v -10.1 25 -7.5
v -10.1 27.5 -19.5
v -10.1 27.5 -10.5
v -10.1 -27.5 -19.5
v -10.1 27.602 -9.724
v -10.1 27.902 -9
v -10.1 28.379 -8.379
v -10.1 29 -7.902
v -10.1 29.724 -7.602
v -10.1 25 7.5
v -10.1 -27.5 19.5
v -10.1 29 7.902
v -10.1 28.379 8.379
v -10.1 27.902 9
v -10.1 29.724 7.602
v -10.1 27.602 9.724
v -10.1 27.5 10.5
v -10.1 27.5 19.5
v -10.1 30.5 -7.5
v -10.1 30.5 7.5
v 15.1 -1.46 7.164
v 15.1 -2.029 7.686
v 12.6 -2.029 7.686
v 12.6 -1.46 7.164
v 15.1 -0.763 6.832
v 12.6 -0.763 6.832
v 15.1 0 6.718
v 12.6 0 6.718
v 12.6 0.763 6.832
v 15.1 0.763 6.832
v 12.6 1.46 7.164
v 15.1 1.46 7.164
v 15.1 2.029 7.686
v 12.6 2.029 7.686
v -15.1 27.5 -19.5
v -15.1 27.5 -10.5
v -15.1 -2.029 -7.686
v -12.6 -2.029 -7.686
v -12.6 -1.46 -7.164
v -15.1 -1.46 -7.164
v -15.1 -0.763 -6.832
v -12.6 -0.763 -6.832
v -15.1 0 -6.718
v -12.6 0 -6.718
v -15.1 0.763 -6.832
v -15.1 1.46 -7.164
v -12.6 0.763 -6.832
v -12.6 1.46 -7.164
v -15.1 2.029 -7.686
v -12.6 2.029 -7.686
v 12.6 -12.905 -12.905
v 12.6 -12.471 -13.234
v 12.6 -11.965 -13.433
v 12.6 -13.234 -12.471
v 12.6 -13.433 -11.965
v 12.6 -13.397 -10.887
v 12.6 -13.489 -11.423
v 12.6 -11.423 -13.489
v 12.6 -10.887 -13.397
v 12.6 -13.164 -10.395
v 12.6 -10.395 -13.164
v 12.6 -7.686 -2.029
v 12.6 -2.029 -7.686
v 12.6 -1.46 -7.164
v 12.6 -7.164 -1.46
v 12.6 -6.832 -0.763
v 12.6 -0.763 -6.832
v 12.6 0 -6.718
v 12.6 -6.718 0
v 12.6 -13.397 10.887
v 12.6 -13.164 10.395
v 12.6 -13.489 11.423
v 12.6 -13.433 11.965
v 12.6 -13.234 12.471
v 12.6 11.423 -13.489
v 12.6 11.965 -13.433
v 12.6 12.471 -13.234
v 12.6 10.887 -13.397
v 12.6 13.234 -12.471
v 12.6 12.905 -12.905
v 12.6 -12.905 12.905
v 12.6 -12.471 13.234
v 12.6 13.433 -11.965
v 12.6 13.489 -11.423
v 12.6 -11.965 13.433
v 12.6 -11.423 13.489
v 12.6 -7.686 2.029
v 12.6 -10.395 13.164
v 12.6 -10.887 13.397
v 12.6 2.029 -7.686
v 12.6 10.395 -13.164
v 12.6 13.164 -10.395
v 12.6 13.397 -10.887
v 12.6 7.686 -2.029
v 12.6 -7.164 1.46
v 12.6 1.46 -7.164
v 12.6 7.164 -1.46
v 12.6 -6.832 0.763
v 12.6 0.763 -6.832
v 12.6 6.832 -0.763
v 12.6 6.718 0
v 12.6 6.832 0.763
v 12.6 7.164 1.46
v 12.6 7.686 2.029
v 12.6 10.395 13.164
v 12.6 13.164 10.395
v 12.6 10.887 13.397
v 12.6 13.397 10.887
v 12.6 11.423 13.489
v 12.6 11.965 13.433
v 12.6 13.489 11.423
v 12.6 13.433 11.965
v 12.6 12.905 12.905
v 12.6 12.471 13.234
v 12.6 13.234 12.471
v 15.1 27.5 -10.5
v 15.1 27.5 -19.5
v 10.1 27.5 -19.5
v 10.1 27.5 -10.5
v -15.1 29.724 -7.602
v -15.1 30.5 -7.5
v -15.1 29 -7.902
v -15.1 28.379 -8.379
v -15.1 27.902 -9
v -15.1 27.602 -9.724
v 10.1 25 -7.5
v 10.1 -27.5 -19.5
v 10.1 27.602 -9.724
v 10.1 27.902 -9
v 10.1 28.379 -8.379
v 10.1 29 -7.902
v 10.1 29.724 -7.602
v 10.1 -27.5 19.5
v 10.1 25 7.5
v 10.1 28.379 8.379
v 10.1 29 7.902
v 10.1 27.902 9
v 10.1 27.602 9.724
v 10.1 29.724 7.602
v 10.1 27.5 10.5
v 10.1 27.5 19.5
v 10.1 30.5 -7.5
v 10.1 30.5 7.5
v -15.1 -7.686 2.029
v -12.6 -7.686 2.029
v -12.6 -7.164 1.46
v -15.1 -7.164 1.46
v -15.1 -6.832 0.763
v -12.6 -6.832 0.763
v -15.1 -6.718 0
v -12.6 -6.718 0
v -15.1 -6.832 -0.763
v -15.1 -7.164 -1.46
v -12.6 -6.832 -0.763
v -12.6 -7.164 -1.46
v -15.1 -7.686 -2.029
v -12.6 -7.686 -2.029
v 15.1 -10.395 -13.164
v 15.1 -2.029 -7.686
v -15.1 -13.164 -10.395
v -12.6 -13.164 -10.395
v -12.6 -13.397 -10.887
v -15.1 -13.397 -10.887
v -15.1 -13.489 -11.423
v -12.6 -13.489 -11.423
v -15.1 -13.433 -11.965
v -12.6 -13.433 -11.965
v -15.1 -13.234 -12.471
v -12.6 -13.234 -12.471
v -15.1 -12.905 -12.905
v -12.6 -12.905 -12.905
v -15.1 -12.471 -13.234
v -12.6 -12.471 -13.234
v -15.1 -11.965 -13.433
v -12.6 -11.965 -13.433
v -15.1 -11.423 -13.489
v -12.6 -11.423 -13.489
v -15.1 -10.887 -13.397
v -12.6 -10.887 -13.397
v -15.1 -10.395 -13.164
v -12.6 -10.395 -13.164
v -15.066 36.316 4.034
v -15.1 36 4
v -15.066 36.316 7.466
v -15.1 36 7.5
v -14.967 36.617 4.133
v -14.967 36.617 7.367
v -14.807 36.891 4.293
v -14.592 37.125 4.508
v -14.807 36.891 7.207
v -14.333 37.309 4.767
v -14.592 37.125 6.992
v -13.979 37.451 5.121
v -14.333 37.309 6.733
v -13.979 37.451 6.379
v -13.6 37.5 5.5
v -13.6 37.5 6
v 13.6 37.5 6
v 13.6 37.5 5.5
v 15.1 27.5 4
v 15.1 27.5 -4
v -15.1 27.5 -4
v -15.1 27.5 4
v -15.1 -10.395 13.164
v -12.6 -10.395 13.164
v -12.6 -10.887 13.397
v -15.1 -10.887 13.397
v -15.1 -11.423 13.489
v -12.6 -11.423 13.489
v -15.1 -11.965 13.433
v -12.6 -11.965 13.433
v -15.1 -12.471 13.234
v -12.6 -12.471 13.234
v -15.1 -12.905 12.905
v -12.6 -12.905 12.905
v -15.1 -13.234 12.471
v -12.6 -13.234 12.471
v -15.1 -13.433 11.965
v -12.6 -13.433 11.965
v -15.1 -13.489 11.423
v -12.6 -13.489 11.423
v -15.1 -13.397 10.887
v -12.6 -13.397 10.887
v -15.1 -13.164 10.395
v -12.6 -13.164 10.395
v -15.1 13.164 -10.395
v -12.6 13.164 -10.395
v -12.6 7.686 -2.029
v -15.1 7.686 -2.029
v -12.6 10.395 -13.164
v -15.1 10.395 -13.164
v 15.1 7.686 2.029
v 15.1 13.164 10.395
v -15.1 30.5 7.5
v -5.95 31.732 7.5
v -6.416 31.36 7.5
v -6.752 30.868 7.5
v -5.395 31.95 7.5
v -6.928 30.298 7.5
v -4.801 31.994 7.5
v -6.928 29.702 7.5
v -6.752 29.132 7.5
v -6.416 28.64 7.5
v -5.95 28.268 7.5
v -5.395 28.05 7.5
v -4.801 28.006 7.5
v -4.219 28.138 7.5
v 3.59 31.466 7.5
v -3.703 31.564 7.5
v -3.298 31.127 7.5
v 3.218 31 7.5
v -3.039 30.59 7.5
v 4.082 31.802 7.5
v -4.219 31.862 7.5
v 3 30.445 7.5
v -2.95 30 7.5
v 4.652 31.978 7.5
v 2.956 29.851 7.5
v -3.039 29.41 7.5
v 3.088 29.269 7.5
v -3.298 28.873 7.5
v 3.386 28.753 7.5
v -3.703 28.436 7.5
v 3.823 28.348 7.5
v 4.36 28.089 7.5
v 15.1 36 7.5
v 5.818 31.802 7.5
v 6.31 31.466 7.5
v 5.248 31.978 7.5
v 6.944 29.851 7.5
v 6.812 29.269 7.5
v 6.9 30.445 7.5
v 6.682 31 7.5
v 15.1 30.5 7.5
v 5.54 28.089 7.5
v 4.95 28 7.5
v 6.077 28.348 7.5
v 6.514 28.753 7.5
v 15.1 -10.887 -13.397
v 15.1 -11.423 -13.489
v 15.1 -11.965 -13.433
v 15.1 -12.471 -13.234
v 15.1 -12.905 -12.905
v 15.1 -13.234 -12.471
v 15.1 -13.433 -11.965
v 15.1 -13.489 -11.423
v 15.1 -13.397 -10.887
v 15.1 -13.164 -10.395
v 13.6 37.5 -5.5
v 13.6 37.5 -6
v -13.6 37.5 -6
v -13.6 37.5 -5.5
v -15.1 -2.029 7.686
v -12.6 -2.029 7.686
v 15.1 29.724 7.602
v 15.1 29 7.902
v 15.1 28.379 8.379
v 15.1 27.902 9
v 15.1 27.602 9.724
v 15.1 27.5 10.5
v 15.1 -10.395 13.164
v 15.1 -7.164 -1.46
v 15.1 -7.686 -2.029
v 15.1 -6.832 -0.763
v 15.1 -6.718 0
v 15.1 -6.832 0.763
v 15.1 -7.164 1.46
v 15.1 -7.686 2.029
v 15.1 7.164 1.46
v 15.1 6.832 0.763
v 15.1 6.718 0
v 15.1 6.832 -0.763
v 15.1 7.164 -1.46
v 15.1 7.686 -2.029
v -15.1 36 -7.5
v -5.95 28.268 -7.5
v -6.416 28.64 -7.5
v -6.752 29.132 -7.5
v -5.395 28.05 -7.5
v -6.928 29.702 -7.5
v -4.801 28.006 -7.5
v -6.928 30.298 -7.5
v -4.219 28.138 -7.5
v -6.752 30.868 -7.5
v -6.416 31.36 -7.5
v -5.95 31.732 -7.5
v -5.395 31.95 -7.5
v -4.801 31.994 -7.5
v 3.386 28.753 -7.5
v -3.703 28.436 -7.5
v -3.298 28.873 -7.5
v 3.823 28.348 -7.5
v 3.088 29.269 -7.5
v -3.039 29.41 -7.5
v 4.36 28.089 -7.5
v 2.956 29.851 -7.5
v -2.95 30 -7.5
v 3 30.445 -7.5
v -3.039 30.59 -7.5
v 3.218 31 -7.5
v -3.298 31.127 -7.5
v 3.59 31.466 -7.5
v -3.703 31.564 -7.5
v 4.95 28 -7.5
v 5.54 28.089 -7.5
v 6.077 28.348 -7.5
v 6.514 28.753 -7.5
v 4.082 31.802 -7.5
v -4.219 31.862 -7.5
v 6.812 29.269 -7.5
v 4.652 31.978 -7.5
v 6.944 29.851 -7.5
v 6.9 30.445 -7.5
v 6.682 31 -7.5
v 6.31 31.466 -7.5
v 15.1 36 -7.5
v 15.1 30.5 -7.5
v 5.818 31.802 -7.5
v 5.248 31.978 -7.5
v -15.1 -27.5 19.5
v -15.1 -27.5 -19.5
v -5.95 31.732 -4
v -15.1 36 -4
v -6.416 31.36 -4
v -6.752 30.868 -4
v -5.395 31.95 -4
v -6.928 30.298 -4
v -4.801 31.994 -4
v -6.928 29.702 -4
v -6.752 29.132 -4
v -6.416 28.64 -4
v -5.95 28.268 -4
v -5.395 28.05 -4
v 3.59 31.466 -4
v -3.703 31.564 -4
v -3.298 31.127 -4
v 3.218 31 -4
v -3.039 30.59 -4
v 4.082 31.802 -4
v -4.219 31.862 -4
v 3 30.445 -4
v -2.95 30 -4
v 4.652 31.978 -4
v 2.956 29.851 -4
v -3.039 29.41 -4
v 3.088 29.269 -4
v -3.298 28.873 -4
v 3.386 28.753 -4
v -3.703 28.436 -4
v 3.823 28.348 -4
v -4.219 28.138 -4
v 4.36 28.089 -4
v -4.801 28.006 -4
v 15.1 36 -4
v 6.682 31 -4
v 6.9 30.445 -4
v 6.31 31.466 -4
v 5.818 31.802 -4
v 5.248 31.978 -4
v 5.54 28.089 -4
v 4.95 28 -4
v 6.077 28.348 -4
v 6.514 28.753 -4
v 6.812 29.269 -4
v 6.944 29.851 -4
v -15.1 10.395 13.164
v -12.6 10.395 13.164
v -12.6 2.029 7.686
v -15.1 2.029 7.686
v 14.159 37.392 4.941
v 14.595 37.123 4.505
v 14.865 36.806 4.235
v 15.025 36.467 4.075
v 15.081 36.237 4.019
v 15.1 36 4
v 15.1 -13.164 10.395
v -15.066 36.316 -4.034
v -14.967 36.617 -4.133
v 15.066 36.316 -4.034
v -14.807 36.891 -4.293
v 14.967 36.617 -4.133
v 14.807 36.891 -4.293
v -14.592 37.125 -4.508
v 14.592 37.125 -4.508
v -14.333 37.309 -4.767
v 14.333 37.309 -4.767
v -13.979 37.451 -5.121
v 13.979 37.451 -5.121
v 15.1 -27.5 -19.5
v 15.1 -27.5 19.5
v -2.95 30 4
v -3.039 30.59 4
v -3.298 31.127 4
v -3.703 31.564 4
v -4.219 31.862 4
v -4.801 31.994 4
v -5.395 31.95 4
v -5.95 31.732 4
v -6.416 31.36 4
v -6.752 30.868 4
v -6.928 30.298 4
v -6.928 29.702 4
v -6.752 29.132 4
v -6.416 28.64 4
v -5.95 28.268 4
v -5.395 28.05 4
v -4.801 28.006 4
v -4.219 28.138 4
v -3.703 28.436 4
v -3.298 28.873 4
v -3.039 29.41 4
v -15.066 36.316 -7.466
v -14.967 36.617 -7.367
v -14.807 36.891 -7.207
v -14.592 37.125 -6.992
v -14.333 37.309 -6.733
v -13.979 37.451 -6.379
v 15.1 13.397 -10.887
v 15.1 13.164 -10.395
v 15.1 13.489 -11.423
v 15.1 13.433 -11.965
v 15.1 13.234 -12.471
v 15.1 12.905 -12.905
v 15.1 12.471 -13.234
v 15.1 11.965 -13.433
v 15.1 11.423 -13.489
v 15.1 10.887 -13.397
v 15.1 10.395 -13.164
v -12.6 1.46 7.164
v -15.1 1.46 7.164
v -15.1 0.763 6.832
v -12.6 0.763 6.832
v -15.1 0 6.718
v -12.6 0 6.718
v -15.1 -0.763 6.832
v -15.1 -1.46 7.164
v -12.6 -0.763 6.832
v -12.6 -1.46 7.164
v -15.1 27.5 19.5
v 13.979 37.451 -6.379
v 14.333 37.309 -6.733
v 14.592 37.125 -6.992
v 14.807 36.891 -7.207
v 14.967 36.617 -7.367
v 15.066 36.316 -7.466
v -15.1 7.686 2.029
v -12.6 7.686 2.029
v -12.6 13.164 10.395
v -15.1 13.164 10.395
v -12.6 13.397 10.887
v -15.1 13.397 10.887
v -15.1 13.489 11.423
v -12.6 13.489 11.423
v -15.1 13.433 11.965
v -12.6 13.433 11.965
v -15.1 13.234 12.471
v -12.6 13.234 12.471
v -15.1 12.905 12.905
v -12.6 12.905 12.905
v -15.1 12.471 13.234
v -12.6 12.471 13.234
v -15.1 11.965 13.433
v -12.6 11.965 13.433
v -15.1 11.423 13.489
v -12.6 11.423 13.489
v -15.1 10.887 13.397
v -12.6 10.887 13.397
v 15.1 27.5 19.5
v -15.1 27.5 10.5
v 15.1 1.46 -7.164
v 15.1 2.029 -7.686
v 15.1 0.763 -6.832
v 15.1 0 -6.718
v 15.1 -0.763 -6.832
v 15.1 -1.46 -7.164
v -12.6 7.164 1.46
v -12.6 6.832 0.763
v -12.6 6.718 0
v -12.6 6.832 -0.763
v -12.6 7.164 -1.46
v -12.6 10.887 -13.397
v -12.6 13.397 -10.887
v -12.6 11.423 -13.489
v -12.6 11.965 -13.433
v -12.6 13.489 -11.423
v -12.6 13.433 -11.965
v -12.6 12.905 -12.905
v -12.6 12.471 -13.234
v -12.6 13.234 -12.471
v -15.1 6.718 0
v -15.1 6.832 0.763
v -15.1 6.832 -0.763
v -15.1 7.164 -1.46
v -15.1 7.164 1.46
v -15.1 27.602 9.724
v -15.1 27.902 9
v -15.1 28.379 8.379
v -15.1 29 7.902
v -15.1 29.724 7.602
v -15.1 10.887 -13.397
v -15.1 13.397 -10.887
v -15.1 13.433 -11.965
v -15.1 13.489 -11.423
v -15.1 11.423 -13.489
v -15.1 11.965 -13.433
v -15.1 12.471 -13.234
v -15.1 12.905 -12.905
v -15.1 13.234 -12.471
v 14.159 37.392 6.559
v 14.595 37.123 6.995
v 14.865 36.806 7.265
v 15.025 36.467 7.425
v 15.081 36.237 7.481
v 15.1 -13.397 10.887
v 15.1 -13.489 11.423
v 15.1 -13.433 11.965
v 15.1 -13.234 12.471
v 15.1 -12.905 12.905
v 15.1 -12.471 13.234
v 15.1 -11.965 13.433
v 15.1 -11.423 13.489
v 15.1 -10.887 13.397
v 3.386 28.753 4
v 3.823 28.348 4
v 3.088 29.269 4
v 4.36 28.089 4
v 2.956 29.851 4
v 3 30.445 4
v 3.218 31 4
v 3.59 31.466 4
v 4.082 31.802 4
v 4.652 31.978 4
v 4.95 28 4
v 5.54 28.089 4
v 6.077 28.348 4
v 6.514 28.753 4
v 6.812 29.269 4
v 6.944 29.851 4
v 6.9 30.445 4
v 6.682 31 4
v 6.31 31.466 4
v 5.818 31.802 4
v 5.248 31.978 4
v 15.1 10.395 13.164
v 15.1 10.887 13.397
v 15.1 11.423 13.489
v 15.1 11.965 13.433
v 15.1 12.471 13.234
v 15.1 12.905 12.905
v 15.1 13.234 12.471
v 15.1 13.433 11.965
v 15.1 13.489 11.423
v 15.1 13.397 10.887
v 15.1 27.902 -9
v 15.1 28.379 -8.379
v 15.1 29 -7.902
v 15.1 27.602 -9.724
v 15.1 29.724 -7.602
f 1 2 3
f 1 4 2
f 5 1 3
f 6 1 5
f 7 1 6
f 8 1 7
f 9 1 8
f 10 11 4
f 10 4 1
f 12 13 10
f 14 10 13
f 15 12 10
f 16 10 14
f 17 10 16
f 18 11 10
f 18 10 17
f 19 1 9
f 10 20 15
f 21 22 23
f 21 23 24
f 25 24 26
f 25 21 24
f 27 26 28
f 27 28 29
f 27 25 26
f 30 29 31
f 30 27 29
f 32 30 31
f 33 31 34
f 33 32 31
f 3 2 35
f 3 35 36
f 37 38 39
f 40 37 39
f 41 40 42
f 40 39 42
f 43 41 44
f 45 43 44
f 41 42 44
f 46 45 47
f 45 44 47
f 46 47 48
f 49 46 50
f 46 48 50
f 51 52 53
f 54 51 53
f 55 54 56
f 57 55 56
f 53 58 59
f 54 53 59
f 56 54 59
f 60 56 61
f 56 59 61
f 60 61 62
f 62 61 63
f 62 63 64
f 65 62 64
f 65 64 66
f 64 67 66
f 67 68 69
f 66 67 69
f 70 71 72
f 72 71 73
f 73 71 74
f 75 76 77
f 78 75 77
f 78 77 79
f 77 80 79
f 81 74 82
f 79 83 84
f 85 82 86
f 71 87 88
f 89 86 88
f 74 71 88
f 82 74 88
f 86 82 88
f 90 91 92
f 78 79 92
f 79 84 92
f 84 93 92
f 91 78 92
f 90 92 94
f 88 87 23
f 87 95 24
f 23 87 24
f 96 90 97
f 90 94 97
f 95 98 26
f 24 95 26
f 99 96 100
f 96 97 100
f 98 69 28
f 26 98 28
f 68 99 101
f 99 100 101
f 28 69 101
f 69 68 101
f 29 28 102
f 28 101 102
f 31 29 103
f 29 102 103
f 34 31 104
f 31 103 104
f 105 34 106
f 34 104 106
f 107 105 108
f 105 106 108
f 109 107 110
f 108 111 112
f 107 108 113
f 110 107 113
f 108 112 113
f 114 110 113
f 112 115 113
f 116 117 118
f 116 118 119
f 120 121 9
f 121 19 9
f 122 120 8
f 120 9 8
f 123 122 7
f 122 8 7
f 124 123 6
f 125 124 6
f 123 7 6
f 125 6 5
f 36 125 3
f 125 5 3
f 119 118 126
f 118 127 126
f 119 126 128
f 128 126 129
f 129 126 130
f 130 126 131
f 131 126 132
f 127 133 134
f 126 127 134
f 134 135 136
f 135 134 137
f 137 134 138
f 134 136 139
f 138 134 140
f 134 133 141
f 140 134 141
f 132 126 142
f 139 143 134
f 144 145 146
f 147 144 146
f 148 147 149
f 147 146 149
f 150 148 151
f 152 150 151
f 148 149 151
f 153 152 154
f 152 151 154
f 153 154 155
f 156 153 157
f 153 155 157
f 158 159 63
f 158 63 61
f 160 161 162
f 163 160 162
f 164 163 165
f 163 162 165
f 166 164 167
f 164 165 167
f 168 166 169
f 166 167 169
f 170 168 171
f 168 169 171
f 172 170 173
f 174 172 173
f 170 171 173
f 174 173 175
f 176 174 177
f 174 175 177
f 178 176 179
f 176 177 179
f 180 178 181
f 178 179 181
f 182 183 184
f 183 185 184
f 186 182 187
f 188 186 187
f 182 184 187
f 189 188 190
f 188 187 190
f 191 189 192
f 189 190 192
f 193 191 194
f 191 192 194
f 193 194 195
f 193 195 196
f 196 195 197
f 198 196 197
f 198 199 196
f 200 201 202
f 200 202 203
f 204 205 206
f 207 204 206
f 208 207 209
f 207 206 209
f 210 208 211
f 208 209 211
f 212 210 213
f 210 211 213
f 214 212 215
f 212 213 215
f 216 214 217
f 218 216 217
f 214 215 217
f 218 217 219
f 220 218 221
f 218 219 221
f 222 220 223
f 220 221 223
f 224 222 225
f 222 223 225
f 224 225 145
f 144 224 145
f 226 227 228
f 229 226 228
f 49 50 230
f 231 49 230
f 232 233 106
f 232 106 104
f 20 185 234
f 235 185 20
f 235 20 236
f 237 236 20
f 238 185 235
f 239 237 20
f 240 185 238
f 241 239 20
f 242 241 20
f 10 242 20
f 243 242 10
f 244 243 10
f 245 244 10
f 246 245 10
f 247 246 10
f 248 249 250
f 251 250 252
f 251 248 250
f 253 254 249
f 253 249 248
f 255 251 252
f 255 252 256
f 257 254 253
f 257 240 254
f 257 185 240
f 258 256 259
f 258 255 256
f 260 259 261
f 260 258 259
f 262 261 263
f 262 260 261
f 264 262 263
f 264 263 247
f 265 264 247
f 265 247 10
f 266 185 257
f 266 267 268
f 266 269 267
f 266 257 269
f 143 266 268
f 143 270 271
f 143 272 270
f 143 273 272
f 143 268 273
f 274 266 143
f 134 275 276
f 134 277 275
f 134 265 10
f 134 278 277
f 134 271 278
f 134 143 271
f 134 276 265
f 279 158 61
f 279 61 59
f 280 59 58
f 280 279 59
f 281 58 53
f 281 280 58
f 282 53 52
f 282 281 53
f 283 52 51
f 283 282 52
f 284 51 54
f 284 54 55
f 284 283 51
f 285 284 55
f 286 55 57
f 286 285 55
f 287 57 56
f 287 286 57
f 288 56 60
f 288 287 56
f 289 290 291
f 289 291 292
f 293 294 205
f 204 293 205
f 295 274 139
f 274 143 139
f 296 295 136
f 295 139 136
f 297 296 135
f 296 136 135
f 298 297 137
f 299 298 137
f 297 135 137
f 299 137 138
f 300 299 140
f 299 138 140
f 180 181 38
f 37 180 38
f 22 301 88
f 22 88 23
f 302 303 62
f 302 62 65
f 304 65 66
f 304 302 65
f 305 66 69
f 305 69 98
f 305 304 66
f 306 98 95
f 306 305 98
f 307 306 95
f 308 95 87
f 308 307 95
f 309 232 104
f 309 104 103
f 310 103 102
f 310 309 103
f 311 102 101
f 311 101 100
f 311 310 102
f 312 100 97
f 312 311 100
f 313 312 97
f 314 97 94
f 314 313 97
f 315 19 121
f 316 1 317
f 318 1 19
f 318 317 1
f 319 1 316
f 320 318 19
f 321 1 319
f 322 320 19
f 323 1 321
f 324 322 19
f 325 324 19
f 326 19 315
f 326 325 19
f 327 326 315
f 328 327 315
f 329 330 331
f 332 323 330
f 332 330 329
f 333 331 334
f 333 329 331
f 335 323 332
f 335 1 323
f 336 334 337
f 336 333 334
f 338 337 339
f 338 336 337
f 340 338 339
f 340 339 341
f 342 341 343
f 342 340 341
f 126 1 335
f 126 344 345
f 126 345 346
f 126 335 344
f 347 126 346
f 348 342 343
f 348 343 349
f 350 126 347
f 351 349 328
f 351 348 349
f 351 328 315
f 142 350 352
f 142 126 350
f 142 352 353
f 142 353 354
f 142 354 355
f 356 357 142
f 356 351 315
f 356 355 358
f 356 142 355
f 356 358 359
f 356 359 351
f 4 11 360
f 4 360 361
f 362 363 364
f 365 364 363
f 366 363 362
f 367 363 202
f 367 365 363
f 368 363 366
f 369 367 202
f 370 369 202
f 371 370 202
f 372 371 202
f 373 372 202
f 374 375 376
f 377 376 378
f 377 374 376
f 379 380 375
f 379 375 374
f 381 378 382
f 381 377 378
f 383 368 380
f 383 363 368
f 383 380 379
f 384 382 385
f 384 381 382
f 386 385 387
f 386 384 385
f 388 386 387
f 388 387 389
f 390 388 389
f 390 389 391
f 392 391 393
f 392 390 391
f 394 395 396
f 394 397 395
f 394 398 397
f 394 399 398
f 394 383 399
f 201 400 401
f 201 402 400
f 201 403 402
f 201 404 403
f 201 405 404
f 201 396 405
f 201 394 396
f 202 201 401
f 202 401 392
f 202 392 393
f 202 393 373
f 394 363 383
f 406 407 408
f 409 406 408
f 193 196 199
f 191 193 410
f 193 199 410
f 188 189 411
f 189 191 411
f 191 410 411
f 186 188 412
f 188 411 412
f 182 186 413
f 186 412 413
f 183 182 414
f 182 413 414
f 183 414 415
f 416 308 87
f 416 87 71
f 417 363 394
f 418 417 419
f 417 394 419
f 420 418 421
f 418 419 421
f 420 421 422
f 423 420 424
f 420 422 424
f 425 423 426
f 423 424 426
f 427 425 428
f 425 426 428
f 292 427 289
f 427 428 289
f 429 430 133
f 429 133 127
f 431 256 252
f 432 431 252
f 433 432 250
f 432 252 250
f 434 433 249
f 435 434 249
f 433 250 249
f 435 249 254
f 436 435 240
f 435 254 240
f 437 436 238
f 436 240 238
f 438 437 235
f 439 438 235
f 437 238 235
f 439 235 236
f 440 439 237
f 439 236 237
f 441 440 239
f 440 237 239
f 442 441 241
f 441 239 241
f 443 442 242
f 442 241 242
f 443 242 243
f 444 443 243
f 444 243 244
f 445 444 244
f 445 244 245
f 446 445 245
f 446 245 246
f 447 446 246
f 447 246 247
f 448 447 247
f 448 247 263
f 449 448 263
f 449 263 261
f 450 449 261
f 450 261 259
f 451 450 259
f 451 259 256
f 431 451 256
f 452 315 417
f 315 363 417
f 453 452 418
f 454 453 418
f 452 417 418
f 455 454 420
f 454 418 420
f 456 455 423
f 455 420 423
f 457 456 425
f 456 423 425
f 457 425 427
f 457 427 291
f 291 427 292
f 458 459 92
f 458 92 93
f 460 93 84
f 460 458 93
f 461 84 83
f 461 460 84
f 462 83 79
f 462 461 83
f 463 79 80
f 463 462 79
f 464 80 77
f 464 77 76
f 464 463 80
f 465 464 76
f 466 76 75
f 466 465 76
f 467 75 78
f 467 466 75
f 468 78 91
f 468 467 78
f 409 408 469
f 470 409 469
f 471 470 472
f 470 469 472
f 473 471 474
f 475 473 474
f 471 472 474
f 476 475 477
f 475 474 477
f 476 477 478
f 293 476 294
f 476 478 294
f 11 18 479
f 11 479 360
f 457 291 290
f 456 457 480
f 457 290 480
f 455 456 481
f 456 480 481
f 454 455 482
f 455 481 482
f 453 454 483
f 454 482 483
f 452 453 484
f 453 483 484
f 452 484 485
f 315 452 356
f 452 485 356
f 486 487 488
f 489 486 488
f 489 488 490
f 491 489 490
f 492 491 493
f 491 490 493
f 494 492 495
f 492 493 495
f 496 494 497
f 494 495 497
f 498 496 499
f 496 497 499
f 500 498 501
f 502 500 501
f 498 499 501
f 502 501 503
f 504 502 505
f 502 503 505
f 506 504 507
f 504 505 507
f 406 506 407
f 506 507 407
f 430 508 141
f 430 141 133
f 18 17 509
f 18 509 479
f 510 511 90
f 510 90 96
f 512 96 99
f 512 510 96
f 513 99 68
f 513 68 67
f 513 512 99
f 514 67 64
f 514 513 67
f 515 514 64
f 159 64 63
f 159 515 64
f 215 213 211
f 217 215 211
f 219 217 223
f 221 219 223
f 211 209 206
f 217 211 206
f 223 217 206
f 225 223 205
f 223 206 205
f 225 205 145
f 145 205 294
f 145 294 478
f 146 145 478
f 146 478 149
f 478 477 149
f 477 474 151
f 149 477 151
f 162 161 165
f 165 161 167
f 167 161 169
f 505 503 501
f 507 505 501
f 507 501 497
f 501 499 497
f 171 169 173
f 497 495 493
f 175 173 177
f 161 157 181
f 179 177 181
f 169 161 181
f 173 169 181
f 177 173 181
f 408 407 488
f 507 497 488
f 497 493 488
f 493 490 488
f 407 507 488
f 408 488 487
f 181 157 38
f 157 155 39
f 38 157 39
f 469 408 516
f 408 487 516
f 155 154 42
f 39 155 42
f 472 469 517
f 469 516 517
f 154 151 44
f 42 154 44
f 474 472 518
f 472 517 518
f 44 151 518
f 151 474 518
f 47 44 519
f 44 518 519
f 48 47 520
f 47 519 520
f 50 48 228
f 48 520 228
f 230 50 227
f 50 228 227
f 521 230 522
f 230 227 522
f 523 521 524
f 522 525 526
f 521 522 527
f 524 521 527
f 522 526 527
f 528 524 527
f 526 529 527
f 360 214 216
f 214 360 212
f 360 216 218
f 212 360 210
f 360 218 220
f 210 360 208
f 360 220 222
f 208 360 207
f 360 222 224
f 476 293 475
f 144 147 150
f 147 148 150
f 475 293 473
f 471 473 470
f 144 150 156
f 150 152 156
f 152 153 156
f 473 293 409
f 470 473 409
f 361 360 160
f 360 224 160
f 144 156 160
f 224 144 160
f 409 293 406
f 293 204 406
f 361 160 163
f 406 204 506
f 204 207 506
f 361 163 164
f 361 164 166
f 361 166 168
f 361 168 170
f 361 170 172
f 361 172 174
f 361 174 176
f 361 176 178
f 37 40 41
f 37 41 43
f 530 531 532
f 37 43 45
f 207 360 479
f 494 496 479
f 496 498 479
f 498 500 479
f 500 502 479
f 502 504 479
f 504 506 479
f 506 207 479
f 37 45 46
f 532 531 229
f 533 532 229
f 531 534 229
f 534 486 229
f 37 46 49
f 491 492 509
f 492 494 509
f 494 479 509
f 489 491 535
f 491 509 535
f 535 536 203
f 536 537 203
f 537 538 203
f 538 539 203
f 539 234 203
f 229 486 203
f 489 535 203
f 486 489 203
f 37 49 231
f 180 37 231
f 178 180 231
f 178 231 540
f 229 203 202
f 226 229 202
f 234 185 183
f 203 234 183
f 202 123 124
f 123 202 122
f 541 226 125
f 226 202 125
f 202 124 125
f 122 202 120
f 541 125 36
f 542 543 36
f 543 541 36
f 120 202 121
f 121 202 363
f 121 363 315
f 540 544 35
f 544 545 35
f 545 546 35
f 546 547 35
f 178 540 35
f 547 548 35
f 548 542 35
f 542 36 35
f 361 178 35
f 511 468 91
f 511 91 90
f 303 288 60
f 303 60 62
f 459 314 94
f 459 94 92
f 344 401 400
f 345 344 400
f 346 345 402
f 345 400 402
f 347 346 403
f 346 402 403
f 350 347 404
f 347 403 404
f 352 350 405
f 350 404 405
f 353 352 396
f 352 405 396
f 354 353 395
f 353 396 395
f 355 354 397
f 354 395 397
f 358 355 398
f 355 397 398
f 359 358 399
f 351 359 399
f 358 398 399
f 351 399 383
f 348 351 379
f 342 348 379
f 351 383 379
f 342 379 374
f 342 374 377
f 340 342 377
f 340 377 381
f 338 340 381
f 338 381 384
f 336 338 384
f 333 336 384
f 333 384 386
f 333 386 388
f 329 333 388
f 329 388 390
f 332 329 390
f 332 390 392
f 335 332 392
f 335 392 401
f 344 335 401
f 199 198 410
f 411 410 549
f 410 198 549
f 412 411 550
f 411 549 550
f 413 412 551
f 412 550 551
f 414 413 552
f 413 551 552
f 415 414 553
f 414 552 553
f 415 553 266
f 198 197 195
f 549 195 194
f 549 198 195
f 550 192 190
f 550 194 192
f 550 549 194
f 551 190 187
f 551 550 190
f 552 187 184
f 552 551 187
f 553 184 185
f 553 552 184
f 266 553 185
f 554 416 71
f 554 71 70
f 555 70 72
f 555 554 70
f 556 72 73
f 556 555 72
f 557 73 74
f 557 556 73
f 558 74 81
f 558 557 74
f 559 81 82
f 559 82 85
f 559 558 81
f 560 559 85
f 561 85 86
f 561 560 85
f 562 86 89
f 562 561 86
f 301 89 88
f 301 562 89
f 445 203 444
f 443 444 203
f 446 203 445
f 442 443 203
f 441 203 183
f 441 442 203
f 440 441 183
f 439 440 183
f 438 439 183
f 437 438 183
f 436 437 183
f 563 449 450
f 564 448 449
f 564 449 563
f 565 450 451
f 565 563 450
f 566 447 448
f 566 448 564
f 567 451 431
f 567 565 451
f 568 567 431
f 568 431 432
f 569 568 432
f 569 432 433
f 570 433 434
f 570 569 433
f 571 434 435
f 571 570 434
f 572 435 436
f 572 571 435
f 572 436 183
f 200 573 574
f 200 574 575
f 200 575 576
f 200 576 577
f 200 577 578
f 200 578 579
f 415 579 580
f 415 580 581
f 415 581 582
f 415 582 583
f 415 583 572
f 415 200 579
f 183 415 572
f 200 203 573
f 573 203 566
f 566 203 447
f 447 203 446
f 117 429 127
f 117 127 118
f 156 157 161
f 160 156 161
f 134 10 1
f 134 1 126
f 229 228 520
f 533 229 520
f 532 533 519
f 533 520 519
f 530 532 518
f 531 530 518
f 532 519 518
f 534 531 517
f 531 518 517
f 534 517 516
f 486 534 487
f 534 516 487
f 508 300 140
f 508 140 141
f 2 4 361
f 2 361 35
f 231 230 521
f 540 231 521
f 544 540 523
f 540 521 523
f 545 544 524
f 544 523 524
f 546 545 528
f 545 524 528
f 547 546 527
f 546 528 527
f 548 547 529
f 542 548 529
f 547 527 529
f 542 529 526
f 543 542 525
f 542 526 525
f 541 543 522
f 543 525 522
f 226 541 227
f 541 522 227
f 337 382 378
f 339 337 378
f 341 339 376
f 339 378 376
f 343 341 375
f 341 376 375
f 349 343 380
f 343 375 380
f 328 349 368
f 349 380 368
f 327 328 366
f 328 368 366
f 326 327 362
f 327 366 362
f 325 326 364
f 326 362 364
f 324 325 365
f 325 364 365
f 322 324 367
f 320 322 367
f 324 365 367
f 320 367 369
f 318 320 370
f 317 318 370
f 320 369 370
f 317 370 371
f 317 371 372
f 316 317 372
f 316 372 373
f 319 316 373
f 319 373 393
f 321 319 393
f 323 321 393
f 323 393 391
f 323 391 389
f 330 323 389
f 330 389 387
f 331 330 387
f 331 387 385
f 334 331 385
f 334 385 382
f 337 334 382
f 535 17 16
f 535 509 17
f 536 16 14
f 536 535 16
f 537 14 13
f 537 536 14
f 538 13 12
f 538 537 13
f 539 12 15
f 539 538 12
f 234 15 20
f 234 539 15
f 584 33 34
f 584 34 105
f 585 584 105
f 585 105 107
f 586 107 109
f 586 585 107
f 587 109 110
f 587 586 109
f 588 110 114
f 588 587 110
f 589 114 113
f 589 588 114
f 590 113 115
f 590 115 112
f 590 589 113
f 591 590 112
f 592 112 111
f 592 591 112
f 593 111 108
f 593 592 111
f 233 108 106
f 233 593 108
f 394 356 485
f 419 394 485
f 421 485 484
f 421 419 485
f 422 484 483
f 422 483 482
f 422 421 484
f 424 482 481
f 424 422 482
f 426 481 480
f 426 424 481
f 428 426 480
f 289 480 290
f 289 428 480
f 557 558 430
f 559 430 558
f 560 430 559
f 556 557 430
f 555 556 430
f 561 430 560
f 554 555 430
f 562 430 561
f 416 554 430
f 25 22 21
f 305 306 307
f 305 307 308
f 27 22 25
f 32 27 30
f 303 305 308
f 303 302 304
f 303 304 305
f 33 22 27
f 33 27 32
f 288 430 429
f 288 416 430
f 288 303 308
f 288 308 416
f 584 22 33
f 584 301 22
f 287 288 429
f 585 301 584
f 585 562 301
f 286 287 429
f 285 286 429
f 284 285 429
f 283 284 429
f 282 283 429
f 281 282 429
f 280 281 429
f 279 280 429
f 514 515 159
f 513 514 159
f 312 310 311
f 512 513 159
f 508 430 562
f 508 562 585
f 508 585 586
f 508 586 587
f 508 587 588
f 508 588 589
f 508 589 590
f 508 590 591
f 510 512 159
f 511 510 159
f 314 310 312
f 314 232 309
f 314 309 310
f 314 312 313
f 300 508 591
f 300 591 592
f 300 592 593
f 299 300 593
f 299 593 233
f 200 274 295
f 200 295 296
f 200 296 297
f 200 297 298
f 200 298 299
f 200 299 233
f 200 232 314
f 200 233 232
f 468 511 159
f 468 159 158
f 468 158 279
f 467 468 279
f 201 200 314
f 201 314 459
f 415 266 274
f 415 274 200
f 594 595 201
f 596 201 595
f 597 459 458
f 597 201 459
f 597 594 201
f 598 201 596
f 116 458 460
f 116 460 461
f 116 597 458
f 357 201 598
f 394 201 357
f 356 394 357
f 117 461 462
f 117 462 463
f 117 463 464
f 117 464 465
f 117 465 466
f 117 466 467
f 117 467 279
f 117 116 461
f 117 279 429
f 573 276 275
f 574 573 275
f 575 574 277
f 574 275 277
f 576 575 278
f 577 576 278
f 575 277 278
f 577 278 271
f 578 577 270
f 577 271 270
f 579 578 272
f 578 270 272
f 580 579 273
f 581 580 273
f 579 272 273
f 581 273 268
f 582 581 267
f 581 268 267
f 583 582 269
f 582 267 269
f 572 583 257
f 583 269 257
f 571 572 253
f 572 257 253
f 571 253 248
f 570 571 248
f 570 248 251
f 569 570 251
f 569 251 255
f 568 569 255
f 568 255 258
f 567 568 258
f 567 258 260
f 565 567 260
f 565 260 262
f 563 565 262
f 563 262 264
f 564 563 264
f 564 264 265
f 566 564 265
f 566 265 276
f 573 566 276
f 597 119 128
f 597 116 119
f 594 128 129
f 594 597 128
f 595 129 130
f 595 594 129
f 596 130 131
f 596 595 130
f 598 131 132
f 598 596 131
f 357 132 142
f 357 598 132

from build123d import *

# Parameters (mm, degrees)
BOSS_EXTRUDE1_DEPTH = 15.1
SKETCH2_W           = 20.2
SKETCH2_H           = 52.5
CUT_EXTRUDE1_DEPTH  = 39
SKETCH3_W           = 20.2
SKETCH3_H           = 12
CUT_EXTRUDE2_DEPTH  = 2.5
FILLET1_R           = 3
FILLET2_R           = 1.5
CUT_EXTRUDE3_REACH  = 50.613
SKETCH4_R           = 2
CUT_EXTRUDE4_DEPTH  = 2.5
CUT_EXTRUDE5_START  = -2.5
CUT_EXTRUDE5_DEPTH  = 2.5


with BuildPart() as part:
    # Sketch1 → Boss-Extrude1 (new, symmetric)
    with BuildSketch(Plane(origin=(0, 0, 0), x_dir=(0, 0, -1), z_dir=(1, 0, 0))):
        Polygon((-19.5, -27.5), (19.5, -27.5), (19.5, 27.5), (7.5, 27.5), (7.5, 37.5), (4, 37.5), (4, 27.5), (-4, 27.5), (-4, 37.5), (-7.5, 37.5), (-7.5, 27.5), (-19.5, 27.5), align=None)
    extrude(amount=BOSS_EXTRUDE1_DEPTH, both=True)

    # Sketch2 → Cut-Extrude1 (cut)
    with BuildSketch(Plane.XY.offset(19.5)):
        with Locations((0, -1.25)):
            Rectangle(SKETCH2_W, SKETCH2_H)
    extrude(amount=-CUT_EXTRUDE1_DEPTH, mode=Mode.SUBTRACT)

    # Sketch3 → Cut-Extrude2 (cut)
    with BuildSketch(Plane(origin=(0, 27.5, 0), x_dir=(1, 0, 0), z_dir=(0, 1, 0))):
        with Locations((0, -13.5)):
            Rectangle(SKETCH3_W, SKETCH3_H)
        with Locations((0, 13.5)):
            Rectangle(SKETCH3_W, SKETCH3_H)
    extrude(amount=-CUT_EXTRUDE2_DEPTH, mode=Mode.SUBTRACT)

    # Fillet1
    fillet1_edges = [part.edges().sort_by_distance(p)[0] for p in [
        (12.6, 27.5, 7.5),
        (12.6, 27.5, -7.5),
        (-12.6, 27.5, 7.5),
        (-12.6, 27.5, -7.5),
    ]]
    fillet(fillet1_edges, radius=FILLET1_R)

    # Fillet2
    fillet2_edges = [part.edges().sort_by_distance(p)[0] for p in [
        (15.1, 37.5, -5.75),
        (-15.1, 37.5, 5.75),
        (-15.1, 37.5, -5.75),
        (0, 37.5, 7.5),
        (0, 37.5, 4),
        (0, 37.5, -4),
        (0, 37.5, -7.5),
        (15.1, 37.5, 5.75),
    ]]
    fillet(fillet2_edges, radius=FILLET2_R)

    # Cut-Extrude3: up to this face of the body (flat: up to its plane)
    cut_extrude3_end = Plane(part.part.faces().sort_by_distance((0, 31.045634921, -7.5))[0])
    # Sketch4 → Cut-Extrude3 (cut, up to the picked face)
    with BuildSketch(Plane.XY.offset(7.5), mode=Mode.PRIVATE) as cut_extrude3_sk1:
        with Locations((-4.95, 30)):
            Circle(SKETCH4_R)
    cut_extrude3_tool1 = split(extrude(cut_extrude3_sk1.sketch, amount=-CUT_EXTRUDE3_REACH, mode=Mode.PRIVATE), bisect_by=cut_extrude3_end, keep=Keep.BOTH, mode=Mode.PRIVATE)
    # Sketch4 → Cut-Extrude3 (cut, up to the picked face)
    with BuildSketch(Plane.XY.offset(7.5), mode=Mode.PRIVATE) as cut_extrude3_sk2:
        with Locations(Location((4.95, 30, 0), (0, 0, 270))):
            Circle(SKETCH4_R)
    cut_extrude3_tool2 = split(extrude(cut_extrude3_sk2.sketch, amount=-CUT_EXTRUDE3_REACH, mode=Mode.PRIVATE), bisect_by=cut_extrude3_end, keep=Keep.BOTH, mode=Mode.PRIVATE)
    add(cut_extrude3_tool1.solids().sort_by(Axis((-4.95, 30, 7.5), (0, 0, -1)))[0], mode=Mode.SUBTRACT)
    add(cut_extrude3_tool2.solids().sort_by(Axis((4.95, 30, 7.5), (0, 0, -1)))[0], mode=Mode.SUBTRACT)

    # Sketch5 → Cut-Extrude4 (cut)
    with BuildSketch(Plane(origin=(15.1, 0, 0), x_dir=(0, 0, -1), z_dir=(1, 0, 0))):
        with BuildLine():
            Line((13.163699082, 10.394877926), (7.685662738, 2.028808489))
            ThreePointArc((7.685662738, 2.028808489), (6.717514421, 0), (7.685662738, -2.028808489))
            Line((7.685662738, -2.028808489), (13.163699082, -10.394877926))
            ThreePointArc((13.163699082, -10.394877926), (12.904698757, -12.904698757), (10.394877926, -13.163699082))
            Line((10.394877926, -13.163699082), (2.028808489, -7.685662738))
            ThreePointArc((2.028808489, -7.685662738), (0, -6.717514421), (-2.028808489, -7.685662738))
            Line((-2.028808489, -7.685662738), (-10.394877926, -13.163699082))
            ThreePointArc((-10.394877926, -13.163699082), (-12.904698757, -12.904698757), (-13.163699082, -10.394877926))
            Line((-13.163699082, -10.394877926), (-7.685662738, -2.028808489))
            ThreePointArc((-7.685662738, -2.028808489), (-6.717514421, 0), (-7.685662738, 2.028808489))
            Line((-7.685662738, 2.028808489), (-13.163699082, 10.394877926))
            ThreePointArc((-13.163699082, 10.394877926), (-12.904698757, 12.904698757), (-10.394877926, 13.163699082))
            Line((-10.394877926, 13.163699082), (-2.028808489, 7.685662738))
            ThreePointArc((-2.028808489, 7.685662738), (0, 6.717514421), (2.028808489, 7.685662738))
            Line((2.028808489, 7.685662738), (10.394877926, 13.163699082))
            ThreePointArc((10.394877926, 13.163699082), (12.904698757, 12.904698757), (13.163699082, 10.394877926))
        make_face()
    extrude(amount=-CUT_EXTRUDE4_DEPTH, mode=Mode.SUBTRACT)

    # Sketch6 → Cut-Extrude5 (cut)
    with BuildSketch(Plane.ZY.offset(15.1).offset(CUT_EXTRUDE5_START)):
        with BuildLine():
            Line((13.163699082, 10.394877926), (7.685662738, 2.028808489))
            ThreePointArc((7.685662738, 2.028808489), (6.717514421, 0), (7.685662738, -2.028808489))
            Line((7.685662738, -2.028808489), (13.163699082, -10.394877926))
            ThreePointArc((13.163699082, -10.394877926), (12.904698757, -12.904698757), (10.394877926, -13.163699082))
            Line((10.394877926, -13.163699082), (2.028808489, -7.685662738))
            ThreePointArc((2.028808489, -7.685662738), (0, -6.717514421), (-2.028808489, -7.685662738))
            Line((-2.028808489, -7.685662738), (-10.394877926, -13.163699082))
            ThreePointArc((-10.394877926, -13.163699082), (-12.904698757, -12.904698757), (-13.163699082, -10.394877926))
            Line((-13.163699082, -10.394877926), (-7.685662738, -2.028808489))
            ThreePointArc((-7.685662738, -2.028808489), (-6.717514421, 0), (-7.685662738, 2.028808489))
            Line((-7.685662738, 2.028808489), (-13.163699082, 10.394877926))
            ThreePointArc((-13.163699082, 10.394877926), (-12.904698757, 12.904698757), (-10.394877926, 13.163699082))
            Line((-10.394877926, 13.163699082), (-2.028808489, 7.685662738))
            ThreePointArc((-2.028808489, 7.685662738), (0, 6.717514421), (2.028808489, 7.685662738))
            Line((2.028808489, 7.685662738), (10.394877926, 13.163699082))
            ThreePointArc((10.394877926, 13.163699082), (12.904698757, 12.904698757), (13.163699082, 10.394877926))
        make_face()
    extrude(amount=CUT_EXTRUDE5_DEPTH, mode=Mode.SUBTRACT)


solid = part.part
